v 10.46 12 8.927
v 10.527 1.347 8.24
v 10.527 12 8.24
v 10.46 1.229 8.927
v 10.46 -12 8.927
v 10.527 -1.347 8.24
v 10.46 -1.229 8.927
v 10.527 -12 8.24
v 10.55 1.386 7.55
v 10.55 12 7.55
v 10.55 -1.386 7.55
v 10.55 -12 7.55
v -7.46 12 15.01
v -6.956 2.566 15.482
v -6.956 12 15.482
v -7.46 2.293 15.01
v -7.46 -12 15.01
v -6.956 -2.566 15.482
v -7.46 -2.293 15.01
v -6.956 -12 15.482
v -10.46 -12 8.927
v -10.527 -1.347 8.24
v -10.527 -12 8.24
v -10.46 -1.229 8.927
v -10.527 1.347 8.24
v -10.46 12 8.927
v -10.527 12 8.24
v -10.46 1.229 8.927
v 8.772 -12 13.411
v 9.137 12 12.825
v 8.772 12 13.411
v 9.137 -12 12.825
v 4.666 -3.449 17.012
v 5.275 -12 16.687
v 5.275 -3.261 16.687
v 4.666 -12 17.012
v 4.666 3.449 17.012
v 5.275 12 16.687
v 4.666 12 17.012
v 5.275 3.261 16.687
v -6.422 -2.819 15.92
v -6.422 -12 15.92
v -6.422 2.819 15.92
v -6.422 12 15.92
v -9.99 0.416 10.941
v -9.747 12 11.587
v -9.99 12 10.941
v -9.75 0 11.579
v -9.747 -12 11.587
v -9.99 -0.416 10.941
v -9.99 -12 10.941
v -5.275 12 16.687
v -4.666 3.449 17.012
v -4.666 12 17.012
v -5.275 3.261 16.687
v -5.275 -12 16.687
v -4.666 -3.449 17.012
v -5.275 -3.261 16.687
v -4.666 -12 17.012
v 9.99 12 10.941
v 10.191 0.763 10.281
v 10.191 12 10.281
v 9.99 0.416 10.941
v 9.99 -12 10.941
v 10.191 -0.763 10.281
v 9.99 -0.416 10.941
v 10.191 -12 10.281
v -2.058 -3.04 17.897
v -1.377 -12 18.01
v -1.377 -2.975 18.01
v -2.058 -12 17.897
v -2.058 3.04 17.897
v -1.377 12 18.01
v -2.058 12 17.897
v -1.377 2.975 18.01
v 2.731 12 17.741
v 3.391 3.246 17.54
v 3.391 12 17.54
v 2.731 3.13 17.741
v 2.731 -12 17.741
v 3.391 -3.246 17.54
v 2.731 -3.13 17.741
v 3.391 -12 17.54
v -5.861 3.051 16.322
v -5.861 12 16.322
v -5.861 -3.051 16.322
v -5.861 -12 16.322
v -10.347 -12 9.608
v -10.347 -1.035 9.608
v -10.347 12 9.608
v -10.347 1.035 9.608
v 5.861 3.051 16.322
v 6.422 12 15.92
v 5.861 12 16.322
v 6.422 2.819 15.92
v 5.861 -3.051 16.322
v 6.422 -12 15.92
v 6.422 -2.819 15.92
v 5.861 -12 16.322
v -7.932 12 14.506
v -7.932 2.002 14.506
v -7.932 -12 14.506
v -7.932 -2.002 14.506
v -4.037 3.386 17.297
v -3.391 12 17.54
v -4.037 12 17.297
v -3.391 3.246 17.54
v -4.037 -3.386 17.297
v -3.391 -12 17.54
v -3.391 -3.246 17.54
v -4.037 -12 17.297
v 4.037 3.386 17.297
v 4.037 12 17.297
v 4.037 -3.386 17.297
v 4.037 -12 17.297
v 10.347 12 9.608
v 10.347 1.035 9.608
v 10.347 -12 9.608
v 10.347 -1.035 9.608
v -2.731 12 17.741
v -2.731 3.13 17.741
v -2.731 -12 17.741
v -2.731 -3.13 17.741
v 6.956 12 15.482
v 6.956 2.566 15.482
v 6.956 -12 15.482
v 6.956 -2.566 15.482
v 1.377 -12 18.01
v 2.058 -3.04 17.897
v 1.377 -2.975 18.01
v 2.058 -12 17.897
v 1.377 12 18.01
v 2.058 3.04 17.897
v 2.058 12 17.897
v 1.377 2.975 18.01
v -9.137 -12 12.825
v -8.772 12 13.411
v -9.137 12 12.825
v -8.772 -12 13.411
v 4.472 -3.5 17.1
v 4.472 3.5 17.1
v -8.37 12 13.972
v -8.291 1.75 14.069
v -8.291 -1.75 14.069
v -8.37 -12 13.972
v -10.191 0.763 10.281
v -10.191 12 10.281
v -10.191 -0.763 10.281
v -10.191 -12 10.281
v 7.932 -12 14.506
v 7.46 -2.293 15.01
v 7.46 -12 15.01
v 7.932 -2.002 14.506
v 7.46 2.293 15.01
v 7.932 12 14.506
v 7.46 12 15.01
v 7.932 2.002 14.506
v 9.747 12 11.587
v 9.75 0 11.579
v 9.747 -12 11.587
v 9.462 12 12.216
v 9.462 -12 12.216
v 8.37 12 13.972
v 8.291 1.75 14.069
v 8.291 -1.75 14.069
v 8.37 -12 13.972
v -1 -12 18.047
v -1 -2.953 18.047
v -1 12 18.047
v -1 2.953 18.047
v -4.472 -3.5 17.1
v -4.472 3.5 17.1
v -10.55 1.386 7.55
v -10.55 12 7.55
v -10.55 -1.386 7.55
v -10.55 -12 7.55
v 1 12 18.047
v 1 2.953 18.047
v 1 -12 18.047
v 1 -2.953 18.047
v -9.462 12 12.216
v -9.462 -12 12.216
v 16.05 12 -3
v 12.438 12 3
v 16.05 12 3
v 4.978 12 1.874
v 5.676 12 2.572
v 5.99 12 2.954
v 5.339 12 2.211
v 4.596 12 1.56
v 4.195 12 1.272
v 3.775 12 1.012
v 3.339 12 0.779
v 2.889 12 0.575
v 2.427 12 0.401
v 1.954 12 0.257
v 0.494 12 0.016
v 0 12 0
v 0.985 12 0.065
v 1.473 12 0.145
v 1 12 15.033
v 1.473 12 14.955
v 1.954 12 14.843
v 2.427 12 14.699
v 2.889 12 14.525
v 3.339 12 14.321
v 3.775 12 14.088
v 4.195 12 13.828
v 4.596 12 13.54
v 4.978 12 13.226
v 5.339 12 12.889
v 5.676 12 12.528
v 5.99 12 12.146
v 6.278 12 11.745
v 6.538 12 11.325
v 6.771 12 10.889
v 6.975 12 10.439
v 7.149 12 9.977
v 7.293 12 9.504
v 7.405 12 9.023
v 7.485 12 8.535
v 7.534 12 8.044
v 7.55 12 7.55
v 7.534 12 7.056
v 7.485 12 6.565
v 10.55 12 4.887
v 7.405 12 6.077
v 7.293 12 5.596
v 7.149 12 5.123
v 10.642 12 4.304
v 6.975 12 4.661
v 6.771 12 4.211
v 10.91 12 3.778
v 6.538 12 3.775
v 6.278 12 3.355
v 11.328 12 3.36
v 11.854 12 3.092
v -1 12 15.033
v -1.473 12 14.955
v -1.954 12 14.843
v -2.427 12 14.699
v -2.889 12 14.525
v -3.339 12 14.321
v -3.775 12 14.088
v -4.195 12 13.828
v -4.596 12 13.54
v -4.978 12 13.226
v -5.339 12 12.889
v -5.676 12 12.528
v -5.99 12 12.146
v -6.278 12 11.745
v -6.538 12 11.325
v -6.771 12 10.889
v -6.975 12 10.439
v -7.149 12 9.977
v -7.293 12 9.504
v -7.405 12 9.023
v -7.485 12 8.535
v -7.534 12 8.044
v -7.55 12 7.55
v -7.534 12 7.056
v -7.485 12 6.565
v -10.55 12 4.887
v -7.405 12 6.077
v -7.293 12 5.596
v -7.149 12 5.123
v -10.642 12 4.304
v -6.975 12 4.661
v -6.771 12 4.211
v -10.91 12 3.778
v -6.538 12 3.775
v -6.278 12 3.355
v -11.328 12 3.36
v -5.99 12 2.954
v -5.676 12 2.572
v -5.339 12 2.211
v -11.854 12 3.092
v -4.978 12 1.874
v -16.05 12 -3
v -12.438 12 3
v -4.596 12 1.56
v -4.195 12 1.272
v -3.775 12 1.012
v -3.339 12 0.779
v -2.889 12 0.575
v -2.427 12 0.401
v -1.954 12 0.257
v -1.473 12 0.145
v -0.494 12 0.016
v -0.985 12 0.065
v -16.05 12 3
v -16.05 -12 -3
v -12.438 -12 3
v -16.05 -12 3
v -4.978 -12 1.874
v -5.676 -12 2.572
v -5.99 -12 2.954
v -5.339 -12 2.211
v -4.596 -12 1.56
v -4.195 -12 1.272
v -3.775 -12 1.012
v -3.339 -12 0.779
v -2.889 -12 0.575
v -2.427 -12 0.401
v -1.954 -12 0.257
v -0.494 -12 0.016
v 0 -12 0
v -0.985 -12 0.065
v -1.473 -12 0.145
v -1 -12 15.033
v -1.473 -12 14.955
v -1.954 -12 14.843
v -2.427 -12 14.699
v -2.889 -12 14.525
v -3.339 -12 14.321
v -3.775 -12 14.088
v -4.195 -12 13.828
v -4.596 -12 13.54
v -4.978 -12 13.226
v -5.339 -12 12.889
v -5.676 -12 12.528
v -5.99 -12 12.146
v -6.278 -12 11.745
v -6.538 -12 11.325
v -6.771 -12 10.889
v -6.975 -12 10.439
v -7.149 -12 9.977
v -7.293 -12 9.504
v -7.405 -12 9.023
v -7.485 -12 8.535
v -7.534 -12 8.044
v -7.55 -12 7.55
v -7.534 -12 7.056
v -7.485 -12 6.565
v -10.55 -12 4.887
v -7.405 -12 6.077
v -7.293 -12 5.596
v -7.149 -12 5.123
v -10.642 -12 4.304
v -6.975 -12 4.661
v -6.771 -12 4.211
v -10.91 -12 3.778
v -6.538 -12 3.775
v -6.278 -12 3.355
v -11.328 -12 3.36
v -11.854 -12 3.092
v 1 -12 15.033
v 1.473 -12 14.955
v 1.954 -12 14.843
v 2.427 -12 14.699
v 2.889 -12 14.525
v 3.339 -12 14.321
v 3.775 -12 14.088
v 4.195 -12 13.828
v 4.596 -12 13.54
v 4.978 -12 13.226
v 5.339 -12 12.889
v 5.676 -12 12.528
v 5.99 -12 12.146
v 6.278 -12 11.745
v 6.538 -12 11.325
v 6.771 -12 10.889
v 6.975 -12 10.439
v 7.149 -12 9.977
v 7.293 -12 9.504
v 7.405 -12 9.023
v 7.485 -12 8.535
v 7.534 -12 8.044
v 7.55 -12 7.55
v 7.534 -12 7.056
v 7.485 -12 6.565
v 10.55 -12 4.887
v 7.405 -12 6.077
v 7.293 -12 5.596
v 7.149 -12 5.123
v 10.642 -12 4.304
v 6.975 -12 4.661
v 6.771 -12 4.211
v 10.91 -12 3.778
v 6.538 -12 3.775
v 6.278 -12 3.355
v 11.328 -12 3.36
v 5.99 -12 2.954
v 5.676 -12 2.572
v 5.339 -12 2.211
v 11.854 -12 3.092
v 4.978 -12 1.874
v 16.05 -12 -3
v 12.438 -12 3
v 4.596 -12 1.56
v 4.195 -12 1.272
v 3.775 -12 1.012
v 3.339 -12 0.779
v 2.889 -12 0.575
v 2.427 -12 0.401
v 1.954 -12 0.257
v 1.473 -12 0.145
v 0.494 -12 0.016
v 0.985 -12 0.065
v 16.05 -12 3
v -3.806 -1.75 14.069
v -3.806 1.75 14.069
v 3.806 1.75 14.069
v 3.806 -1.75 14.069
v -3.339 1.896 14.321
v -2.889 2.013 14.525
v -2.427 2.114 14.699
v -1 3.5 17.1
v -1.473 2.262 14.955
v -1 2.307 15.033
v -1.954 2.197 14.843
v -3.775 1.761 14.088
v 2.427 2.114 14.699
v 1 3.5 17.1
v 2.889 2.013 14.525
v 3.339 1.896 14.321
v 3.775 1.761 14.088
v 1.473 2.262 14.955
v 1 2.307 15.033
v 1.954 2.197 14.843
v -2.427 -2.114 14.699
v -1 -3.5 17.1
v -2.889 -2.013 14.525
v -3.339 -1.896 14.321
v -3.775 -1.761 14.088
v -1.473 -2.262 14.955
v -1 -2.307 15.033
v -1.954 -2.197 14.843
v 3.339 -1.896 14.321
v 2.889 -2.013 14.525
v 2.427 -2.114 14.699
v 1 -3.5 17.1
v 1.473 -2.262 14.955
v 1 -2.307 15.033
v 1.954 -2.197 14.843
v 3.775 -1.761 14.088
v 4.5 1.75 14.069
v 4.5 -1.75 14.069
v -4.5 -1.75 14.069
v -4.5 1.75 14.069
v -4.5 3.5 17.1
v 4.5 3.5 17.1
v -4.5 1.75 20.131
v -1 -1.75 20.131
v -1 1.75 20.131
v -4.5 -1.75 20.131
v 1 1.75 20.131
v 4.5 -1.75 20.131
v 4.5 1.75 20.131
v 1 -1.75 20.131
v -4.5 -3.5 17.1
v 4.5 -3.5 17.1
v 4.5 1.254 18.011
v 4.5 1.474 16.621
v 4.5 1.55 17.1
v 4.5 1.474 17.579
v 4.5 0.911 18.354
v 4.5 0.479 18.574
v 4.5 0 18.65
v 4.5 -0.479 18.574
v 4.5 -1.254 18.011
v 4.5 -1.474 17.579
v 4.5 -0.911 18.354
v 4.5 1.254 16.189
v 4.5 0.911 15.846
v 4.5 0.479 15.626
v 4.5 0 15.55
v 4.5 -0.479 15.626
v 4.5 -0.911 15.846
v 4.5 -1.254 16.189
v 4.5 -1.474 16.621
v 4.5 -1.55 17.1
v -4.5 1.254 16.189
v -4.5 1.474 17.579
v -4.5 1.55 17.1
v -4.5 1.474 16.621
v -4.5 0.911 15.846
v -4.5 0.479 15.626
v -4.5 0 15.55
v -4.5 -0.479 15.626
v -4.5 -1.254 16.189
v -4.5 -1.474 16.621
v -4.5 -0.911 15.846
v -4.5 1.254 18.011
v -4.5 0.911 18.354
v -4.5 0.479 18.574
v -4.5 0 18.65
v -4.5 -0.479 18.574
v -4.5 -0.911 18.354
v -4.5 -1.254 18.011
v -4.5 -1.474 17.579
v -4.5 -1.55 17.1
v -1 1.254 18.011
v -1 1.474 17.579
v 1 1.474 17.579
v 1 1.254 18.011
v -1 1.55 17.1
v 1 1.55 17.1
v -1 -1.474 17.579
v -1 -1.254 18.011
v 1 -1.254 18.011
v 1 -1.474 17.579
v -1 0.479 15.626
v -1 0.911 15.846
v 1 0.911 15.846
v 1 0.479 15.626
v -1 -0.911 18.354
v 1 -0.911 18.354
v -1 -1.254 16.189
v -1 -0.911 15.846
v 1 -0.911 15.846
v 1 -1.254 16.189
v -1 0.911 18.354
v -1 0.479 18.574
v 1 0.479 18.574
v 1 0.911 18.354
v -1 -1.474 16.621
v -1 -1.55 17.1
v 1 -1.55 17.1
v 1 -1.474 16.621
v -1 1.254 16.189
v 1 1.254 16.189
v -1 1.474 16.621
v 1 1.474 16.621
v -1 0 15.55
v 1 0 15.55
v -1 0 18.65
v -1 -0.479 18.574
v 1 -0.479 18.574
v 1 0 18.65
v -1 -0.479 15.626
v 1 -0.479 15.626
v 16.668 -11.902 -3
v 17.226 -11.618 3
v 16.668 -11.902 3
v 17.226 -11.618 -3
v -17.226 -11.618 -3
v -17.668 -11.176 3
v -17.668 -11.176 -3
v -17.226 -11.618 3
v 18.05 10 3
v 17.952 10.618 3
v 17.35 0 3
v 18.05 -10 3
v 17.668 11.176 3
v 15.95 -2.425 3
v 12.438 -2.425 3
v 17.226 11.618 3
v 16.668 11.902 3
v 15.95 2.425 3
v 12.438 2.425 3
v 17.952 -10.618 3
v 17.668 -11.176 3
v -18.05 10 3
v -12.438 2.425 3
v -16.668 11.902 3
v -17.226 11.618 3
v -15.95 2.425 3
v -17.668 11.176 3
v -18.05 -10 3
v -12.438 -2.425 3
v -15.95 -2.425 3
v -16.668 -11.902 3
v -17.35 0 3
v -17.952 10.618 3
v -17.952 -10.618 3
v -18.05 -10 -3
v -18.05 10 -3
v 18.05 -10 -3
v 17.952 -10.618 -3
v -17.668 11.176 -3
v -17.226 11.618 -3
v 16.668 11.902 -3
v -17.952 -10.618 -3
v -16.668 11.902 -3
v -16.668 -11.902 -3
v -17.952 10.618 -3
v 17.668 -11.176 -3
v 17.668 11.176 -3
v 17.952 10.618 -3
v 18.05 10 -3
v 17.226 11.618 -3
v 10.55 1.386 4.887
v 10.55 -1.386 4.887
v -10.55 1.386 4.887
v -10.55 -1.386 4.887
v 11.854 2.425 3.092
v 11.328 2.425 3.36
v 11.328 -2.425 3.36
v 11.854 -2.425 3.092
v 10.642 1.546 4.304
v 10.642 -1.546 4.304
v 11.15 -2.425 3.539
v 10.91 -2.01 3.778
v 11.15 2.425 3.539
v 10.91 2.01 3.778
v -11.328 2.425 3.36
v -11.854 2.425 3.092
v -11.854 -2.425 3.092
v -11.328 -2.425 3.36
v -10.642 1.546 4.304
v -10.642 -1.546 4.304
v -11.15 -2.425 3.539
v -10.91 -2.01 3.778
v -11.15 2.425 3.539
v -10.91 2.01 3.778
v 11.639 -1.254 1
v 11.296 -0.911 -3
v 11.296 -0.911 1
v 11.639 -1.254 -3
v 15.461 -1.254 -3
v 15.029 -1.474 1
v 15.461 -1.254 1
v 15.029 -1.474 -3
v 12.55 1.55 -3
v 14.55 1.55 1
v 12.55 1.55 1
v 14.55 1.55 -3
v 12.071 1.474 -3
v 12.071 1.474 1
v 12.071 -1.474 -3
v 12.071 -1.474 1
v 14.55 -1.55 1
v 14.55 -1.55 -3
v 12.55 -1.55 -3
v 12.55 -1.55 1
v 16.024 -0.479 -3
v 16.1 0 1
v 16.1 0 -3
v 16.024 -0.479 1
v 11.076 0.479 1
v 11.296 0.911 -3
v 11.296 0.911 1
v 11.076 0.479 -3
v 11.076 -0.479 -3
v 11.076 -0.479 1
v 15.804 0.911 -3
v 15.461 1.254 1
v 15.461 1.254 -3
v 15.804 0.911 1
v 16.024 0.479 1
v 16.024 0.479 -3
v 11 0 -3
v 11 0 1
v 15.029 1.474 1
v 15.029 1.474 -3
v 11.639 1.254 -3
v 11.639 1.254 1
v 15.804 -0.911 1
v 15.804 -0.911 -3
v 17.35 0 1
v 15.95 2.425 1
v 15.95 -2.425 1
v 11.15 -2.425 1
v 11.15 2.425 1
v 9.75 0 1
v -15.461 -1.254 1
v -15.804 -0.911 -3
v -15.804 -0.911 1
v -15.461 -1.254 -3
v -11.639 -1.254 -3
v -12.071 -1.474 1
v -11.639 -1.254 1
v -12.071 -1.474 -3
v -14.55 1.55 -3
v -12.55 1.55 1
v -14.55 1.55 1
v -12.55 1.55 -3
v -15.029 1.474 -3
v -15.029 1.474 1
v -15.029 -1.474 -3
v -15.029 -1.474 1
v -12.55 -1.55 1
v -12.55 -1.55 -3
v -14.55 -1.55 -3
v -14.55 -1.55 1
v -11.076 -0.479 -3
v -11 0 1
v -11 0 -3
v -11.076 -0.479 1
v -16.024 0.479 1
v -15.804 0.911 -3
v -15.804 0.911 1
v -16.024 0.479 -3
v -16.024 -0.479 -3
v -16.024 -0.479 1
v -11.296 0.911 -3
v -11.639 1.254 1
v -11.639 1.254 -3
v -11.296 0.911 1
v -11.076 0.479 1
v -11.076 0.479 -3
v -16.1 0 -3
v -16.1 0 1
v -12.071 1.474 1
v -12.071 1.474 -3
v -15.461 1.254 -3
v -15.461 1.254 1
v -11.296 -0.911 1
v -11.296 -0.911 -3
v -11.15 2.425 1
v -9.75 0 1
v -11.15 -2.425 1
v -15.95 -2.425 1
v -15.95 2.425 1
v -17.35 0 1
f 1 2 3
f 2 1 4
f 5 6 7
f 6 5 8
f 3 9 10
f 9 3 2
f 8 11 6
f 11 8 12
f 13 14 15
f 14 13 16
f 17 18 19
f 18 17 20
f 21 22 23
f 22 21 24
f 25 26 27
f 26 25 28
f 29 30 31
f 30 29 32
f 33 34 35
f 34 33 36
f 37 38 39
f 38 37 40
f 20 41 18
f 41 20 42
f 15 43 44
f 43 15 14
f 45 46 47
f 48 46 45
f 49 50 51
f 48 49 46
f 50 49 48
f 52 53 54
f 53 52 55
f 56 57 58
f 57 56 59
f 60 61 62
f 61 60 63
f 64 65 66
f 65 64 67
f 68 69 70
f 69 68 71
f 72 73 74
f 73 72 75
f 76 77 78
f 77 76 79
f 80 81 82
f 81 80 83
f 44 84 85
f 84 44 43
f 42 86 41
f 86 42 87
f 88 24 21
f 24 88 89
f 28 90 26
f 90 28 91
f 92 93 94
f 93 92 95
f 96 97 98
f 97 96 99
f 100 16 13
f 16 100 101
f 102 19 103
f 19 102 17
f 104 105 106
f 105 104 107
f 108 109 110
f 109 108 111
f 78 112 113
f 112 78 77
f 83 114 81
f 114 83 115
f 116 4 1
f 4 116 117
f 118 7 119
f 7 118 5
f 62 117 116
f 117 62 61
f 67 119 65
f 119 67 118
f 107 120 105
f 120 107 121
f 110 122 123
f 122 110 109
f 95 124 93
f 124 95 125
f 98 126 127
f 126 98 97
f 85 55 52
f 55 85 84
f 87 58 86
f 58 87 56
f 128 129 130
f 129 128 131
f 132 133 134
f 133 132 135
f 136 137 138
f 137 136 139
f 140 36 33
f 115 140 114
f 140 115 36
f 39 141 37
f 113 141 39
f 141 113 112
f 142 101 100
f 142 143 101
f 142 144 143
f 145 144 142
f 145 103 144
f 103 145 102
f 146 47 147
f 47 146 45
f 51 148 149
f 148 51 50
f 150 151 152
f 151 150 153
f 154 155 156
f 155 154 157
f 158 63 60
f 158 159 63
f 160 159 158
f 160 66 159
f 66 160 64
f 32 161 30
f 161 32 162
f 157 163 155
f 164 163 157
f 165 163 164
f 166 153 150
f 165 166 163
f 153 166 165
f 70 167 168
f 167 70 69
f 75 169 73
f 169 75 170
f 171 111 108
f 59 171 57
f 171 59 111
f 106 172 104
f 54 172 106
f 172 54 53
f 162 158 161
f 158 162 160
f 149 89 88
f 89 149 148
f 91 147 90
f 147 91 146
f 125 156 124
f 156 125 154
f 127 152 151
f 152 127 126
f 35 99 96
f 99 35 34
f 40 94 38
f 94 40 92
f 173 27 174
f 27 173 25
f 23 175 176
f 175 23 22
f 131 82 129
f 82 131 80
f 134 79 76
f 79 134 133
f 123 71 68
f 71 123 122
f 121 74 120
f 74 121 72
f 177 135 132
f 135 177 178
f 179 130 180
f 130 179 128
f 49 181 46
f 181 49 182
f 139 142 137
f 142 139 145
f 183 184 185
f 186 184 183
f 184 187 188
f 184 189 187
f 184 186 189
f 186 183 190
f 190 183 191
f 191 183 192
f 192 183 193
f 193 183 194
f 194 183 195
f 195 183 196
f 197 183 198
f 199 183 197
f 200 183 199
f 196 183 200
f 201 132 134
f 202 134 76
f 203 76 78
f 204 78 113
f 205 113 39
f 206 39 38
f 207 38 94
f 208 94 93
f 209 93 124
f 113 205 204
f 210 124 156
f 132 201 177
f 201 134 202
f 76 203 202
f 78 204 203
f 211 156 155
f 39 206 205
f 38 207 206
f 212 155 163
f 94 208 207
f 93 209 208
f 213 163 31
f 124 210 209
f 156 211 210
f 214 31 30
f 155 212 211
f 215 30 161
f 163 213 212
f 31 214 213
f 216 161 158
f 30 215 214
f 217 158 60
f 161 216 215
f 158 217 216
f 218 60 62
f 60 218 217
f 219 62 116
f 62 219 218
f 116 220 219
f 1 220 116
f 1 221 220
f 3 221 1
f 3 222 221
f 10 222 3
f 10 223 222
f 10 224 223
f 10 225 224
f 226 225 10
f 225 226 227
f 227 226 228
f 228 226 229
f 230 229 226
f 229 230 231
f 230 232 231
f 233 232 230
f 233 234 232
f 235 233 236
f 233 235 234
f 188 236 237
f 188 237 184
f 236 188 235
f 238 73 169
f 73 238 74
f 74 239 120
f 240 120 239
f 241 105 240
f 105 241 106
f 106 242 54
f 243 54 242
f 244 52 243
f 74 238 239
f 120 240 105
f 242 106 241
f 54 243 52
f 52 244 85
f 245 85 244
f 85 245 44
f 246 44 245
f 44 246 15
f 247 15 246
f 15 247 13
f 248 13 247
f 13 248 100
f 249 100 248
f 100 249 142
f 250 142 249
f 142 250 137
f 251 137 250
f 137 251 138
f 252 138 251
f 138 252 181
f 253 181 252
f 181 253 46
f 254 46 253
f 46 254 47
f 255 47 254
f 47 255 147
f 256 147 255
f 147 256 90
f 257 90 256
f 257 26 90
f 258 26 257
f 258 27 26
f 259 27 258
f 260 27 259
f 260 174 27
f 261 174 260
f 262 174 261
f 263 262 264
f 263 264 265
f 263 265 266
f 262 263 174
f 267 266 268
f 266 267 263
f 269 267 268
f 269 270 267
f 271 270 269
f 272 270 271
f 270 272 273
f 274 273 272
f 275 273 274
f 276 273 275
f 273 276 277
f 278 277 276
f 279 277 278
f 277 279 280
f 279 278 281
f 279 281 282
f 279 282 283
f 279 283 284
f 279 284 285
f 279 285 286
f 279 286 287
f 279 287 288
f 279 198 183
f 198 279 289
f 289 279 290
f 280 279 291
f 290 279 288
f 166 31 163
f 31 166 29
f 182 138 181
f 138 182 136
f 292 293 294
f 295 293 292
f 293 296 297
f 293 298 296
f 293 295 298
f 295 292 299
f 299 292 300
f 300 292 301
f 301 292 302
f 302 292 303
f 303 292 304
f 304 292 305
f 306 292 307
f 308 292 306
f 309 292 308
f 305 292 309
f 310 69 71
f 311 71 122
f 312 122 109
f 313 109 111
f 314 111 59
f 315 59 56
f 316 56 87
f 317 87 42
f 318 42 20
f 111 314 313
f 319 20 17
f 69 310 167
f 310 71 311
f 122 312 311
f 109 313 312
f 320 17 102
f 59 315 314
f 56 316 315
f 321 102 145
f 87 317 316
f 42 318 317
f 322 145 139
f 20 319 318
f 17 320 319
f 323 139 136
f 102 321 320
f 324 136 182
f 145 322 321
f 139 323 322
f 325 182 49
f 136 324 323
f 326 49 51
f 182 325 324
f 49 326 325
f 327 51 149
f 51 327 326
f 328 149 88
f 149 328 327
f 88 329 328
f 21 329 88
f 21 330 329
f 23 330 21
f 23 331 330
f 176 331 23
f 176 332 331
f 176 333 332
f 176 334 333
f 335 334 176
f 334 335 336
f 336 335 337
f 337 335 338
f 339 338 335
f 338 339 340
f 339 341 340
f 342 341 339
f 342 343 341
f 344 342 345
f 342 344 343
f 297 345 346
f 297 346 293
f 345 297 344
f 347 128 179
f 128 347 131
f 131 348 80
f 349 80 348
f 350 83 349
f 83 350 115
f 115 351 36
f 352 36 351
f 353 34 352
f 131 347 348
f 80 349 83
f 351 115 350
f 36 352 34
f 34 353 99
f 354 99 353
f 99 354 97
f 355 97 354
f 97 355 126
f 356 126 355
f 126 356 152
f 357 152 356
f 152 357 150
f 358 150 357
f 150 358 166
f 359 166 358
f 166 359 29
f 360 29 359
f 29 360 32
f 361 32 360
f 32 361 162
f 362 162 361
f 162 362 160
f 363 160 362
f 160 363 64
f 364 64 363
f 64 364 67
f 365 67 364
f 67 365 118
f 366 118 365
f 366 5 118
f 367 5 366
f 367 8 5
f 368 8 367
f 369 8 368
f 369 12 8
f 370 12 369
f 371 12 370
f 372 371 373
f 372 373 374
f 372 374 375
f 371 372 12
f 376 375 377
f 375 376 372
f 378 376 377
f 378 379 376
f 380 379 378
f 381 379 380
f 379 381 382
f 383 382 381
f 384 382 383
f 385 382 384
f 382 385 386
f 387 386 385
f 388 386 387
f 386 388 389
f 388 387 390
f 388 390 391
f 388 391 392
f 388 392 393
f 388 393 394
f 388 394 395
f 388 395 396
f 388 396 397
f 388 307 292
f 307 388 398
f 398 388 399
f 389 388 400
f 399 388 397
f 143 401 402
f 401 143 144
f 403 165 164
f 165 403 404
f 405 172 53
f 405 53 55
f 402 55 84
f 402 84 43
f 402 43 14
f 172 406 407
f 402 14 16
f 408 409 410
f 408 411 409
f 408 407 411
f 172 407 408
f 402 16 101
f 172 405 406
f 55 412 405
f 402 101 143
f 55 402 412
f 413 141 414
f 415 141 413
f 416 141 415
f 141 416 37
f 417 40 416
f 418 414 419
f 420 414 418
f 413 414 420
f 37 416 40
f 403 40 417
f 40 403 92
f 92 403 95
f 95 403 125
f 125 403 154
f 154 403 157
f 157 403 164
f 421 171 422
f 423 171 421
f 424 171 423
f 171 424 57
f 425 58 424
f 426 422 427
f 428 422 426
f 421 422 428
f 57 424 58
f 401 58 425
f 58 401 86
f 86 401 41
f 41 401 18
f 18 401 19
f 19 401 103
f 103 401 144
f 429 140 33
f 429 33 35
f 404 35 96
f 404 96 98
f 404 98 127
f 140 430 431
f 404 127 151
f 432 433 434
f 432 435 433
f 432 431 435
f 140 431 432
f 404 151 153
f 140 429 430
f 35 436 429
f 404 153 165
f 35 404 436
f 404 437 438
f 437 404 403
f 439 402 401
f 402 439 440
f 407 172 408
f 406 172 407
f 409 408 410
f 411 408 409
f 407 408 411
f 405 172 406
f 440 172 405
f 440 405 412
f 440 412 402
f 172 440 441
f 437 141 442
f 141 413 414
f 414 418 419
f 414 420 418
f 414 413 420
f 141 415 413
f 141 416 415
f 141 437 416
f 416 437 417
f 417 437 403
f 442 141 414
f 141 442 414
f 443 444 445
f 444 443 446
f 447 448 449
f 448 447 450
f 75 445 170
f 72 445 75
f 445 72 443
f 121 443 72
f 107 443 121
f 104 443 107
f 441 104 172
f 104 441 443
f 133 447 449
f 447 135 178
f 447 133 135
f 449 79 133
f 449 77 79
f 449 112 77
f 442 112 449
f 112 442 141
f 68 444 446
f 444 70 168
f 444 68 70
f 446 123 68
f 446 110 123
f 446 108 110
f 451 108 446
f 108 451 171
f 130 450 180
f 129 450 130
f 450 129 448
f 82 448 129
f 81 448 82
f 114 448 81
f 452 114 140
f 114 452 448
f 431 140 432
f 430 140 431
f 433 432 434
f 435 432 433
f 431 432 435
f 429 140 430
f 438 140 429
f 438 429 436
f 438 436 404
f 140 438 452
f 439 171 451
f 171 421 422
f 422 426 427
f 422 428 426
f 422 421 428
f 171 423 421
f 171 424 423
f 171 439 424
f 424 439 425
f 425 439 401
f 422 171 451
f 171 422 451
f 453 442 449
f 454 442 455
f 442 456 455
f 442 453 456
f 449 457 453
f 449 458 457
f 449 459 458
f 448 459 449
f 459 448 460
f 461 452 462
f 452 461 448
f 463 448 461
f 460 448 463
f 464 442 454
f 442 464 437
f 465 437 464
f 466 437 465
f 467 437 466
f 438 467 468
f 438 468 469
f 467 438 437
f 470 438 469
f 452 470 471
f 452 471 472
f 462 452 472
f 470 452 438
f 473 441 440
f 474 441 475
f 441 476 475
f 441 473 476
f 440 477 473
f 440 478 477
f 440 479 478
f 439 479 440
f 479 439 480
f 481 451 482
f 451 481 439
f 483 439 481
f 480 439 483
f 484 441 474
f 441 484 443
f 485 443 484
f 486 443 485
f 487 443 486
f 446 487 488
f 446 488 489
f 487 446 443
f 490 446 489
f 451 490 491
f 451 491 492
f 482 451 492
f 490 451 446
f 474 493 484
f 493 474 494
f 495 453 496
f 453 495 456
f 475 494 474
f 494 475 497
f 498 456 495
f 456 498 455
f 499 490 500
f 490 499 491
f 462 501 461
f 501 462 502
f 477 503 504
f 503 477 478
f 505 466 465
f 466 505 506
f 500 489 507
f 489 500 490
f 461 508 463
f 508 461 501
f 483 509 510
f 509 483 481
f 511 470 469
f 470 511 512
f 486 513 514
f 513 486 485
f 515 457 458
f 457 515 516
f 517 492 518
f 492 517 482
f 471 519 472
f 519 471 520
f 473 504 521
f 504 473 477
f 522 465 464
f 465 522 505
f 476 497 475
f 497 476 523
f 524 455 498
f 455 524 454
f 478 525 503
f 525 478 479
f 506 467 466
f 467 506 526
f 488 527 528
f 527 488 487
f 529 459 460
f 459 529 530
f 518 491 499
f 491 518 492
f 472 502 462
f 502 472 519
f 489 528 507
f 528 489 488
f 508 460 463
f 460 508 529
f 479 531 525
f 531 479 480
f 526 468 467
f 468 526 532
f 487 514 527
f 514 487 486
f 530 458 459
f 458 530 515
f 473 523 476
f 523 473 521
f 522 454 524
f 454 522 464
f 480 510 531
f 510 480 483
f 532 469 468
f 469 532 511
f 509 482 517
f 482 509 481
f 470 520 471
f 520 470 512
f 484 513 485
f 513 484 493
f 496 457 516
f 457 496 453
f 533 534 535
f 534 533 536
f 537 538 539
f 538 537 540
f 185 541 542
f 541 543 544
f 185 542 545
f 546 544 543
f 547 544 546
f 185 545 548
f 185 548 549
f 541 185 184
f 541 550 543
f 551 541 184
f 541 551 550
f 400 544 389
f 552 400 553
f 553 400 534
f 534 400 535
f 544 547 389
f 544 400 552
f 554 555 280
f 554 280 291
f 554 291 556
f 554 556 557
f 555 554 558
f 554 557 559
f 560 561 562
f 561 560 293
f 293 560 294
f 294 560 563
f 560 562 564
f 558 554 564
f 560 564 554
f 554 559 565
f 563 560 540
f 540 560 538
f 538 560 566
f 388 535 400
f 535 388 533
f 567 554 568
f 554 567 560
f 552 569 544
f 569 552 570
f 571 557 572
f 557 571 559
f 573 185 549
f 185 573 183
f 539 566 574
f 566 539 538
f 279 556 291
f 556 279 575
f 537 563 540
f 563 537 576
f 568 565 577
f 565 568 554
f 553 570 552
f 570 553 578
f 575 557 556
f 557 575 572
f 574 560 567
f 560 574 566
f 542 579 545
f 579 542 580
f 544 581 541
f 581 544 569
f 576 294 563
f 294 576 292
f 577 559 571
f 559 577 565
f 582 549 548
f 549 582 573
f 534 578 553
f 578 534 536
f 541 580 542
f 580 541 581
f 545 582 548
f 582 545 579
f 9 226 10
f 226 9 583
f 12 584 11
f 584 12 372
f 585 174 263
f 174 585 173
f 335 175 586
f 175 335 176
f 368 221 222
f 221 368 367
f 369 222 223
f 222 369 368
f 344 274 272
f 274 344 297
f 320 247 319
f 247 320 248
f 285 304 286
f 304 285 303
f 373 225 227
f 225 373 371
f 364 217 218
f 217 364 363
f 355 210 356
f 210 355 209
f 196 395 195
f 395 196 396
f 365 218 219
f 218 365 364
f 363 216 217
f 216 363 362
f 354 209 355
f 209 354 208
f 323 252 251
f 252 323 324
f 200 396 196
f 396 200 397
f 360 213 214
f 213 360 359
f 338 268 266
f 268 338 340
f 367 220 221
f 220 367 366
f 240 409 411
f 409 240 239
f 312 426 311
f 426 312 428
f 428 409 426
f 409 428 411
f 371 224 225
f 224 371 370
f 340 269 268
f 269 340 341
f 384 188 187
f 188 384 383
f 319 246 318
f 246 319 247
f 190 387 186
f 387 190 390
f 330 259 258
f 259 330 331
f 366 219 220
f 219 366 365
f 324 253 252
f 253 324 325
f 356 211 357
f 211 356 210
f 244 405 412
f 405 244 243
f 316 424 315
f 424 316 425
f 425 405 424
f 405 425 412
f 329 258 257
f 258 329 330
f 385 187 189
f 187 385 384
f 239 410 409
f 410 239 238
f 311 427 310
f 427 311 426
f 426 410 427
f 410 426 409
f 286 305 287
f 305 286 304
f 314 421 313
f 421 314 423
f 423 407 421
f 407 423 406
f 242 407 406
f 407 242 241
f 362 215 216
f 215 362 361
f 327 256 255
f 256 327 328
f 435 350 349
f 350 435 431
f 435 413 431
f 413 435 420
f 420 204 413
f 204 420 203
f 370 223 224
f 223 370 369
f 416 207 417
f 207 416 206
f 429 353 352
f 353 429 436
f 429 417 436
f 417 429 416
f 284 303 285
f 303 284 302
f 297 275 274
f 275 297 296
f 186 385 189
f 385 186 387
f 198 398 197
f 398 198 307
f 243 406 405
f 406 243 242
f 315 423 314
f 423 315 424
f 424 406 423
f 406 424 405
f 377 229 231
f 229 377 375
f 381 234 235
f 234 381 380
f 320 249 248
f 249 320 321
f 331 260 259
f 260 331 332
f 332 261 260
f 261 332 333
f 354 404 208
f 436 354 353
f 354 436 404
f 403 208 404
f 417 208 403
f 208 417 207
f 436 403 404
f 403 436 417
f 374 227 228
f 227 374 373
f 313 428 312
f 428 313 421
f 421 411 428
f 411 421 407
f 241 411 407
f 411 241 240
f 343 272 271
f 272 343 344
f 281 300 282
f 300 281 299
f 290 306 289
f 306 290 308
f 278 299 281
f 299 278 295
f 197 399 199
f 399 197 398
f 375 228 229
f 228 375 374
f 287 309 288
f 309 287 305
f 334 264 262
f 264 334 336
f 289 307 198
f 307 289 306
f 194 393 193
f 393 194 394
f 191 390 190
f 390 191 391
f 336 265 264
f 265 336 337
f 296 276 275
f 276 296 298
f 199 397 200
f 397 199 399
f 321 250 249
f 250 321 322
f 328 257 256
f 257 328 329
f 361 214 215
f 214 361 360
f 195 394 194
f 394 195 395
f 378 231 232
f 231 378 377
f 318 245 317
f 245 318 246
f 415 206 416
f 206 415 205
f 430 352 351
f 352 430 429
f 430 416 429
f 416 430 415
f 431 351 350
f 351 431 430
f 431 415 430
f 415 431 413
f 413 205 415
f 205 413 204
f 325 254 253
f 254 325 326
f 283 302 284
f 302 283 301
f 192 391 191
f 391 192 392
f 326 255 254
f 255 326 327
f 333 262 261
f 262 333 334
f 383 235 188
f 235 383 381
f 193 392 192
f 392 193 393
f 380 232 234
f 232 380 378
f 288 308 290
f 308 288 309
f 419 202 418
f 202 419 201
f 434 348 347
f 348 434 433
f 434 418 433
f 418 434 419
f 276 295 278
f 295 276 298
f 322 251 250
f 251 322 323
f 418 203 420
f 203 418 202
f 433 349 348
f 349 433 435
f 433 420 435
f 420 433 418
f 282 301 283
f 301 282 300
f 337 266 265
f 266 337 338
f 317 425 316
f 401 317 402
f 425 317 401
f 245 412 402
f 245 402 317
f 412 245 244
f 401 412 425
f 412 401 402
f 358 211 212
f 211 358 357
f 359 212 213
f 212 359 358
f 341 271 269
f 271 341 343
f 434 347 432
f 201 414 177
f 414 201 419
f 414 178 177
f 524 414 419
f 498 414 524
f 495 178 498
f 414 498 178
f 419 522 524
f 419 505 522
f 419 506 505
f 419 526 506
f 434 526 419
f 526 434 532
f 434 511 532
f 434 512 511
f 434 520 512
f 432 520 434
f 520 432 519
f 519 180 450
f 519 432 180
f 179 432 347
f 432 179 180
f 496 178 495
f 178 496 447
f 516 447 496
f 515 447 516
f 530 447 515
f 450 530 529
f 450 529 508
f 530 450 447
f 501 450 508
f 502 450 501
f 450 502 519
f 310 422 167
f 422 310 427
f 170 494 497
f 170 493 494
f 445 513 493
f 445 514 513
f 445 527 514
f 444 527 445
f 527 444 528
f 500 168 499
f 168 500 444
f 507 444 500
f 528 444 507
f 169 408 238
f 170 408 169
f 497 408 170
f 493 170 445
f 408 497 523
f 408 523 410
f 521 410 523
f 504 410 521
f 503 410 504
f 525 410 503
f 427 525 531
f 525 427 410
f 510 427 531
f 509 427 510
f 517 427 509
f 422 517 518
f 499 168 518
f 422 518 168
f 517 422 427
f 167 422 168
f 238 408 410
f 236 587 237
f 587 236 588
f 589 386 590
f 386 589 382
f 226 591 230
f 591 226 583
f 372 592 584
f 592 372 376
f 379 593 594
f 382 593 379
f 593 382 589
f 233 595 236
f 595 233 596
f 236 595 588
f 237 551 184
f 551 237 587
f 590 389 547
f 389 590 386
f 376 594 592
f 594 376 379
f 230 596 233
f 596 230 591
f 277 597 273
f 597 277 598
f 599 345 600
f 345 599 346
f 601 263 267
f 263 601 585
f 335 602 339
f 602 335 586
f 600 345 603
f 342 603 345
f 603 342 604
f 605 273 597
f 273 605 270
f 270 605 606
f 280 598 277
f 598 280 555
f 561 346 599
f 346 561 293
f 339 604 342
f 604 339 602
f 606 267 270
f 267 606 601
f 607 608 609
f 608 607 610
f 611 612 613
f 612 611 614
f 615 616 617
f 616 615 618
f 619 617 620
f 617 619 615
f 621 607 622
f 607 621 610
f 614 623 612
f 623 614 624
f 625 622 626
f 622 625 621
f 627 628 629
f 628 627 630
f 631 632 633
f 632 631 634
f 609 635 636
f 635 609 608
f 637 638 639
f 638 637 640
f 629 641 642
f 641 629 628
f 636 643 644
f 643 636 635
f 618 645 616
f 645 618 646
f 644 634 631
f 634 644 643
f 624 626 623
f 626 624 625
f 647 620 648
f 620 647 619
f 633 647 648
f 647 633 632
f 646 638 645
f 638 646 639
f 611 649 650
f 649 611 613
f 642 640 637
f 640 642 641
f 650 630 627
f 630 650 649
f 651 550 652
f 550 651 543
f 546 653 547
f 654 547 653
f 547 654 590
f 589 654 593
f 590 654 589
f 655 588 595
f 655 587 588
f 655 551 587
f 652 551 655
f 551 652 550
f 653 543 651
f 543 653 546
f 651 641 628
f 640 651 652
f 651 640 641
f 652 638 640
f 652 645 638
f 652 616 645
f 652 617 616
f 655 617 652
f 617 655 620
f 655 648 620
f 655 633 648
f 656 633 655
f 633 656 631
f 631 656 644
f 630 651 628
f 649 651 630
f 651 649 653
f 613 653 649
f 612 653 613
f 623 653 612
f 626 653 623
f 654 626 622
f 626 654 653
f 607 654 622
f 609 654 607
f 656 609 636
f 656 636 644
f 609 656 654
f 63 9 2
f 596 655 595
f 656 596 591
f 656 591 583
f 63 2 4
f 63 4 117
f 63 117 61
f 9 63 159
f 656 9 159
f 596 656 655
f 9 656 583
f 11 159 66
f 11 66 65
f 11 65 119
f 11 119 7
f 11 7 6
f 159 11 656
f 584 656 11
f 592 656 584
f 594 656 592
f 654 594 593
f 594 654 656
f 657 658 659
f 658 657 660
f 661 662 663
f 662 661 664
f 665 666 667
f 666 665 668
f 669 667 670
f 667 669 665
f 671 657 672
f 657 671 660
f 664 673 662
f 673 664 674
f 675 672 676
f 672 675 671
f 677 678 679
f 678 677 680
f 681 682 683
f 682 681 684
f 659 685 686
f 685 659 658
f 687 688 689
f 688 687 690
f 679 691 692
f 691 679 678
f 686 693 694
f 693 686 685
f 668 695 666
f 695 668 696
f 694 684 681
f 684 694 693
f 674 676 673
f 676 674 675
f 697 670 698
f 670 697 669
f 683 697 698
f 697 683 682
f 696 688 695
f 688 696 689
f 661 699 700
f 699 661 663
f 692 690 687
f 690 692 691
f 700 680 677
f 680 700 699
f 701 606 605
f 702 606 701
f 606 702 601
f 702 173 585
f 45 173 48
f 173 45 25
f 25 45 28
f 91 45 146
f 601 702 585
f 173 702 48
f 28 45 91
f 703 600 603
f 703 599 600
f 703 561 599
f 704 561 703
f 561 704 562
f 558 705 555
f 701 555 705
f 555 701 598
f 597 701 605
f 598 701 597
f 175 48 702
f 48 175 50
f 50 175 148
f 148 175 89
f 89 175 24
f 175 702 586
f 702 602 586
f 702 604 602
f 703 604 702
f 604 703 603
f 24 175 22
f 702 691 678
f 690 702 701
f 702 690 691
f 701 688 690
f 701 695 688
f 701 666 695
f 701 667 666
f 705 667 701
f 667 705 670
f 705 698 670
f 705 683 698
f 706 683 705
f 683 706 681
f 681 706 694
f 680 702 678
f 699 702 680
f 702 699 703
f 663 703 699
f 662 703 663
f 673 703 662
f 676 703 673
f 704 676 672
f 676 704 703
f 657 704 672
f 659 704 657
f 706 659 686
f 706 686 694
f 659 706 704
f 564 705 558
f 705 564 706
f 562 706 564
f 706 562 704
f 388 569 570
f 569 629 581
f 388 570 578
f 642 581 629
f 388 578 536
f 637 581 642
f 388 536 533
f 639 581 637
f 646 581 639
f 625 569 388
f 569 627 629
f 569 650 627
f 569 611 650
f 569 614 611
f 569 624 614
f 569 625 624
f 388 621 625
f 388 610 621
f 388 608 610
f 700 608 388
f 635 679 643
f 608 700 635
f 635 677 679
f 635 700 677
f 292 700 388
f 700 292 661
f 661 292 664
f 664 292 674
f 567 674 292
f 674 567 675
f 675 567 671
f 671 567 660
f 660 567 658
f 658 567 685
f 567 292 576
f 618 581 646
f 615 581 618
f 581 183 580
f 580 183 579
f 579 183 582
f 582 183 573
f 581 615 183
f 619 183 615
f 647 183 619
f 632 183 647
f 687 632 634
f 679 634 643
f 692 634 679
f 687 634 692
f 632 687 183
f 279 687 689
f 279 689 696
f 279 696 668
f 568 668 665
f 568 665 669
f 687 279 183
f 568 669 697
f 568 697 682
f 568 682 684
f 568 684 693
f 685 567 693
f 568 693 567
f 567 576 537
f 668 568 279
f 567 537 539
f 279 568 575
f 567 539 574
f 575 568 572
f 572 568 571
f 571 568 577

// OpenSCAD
//Sammys 3D Printer Bearing holder
//Bearing OD=15mm,L=24mm
OD=15.1;
L=24;
H=3; // Distance from surface to the bearing

difference()
{
  MainPart();
  // mounting holes
  translate([OD/2+6,0,0])
    MountingHoleSingle();
  translate([-(OD/2+6),0,0])
    MountingHoleSingle();
/*
  translate([-(OD/2+6),-(L/2-5),0])
    MountingHoleSingle();
  translate([OD/2+6,-(L/2-5),0])
    MountingHoleSingle();
*/
  // flatten bottom
  translate([0,0,-(5+H)])
    cube([OD*4,L,10], center = true);
}
  
// MODULES

module MountingHoleSingle(){
    hull(){
    translate([1,0,0])
      cylinder(d=3.1,10,$fn=20,center=true);
    translate([-1,0,0])
      cylinder(d=3.1,10,$fn=20,center=true);
    }
    hull(){
    translate([1,0,OD/2+1])
      cylinder(d=5.6,OD,$fn=6,center=true);
    translate([-1,0,OD/2+1])
      cylinder(d=5.6,OD,$fn=6,center=true);
    }
}

module MainPart(){
  difference(){
  union(){
  translate([0,0,-3])
  minkowski()
  {
      cube(size=[OD+17,L-4,10],center=true);    // 14mm for bolts
      cylinder(r=2,$fn=20);
  }

  difference()
  {
      translate([0,0,(OD+2)/2-6/2+2]) // 2mm between bearing and surface
           rotate([90,0,0])
           {
               cylinder(d=OD+6,L,$fn=96,center=true);
           }
      translate([0,0,OD+(4/2)])
           rotate([0,90,0])
                 rotate([0,0,90])
                     cylinder(d=7,OD+6,$fn=6, center=true);
   }
  // add tightening bolt
  translate([0,0,OD+(4/2)])
       rotate([0,90,0])
            rotate([0,0,90])
                 difference(){
                     cylinder(d=7,9,$fn=6, center=true);
                     cylinder(d=3.1,10,$fn=20, center=true);
                 }

  // prepare material for the rounding corner
  translate([-(OD+6)/2,-L/2,0])
       cube([OD+6,L,OD/2]);

  }  // end if union

  translate([0,0,(OD+2)/2-6/2+2]) // 2mm between bearing and surface
       rotate([90,0,0])
       {
            cylinder(d=OD,L+1,$fn=96,center=true);
       }
  translate([0,0,OD])
       cube([2,L+1,20], center=true);
  }

  roundCorner();
  mirror([1,0,0])
       roundCorner();
}

module roundCorner(){
difference()
{
    translate([(OD+6)/2,-L/2,6/2])
         cube([OD/4/2,L,OD/4/2]);
    translate([(OD+6+OD/4)/2,L/2,OD/4/2+6/2])
    rotate([90,0,0])
         cylinder(d=OD/4,L,$fn=20);
}
}
